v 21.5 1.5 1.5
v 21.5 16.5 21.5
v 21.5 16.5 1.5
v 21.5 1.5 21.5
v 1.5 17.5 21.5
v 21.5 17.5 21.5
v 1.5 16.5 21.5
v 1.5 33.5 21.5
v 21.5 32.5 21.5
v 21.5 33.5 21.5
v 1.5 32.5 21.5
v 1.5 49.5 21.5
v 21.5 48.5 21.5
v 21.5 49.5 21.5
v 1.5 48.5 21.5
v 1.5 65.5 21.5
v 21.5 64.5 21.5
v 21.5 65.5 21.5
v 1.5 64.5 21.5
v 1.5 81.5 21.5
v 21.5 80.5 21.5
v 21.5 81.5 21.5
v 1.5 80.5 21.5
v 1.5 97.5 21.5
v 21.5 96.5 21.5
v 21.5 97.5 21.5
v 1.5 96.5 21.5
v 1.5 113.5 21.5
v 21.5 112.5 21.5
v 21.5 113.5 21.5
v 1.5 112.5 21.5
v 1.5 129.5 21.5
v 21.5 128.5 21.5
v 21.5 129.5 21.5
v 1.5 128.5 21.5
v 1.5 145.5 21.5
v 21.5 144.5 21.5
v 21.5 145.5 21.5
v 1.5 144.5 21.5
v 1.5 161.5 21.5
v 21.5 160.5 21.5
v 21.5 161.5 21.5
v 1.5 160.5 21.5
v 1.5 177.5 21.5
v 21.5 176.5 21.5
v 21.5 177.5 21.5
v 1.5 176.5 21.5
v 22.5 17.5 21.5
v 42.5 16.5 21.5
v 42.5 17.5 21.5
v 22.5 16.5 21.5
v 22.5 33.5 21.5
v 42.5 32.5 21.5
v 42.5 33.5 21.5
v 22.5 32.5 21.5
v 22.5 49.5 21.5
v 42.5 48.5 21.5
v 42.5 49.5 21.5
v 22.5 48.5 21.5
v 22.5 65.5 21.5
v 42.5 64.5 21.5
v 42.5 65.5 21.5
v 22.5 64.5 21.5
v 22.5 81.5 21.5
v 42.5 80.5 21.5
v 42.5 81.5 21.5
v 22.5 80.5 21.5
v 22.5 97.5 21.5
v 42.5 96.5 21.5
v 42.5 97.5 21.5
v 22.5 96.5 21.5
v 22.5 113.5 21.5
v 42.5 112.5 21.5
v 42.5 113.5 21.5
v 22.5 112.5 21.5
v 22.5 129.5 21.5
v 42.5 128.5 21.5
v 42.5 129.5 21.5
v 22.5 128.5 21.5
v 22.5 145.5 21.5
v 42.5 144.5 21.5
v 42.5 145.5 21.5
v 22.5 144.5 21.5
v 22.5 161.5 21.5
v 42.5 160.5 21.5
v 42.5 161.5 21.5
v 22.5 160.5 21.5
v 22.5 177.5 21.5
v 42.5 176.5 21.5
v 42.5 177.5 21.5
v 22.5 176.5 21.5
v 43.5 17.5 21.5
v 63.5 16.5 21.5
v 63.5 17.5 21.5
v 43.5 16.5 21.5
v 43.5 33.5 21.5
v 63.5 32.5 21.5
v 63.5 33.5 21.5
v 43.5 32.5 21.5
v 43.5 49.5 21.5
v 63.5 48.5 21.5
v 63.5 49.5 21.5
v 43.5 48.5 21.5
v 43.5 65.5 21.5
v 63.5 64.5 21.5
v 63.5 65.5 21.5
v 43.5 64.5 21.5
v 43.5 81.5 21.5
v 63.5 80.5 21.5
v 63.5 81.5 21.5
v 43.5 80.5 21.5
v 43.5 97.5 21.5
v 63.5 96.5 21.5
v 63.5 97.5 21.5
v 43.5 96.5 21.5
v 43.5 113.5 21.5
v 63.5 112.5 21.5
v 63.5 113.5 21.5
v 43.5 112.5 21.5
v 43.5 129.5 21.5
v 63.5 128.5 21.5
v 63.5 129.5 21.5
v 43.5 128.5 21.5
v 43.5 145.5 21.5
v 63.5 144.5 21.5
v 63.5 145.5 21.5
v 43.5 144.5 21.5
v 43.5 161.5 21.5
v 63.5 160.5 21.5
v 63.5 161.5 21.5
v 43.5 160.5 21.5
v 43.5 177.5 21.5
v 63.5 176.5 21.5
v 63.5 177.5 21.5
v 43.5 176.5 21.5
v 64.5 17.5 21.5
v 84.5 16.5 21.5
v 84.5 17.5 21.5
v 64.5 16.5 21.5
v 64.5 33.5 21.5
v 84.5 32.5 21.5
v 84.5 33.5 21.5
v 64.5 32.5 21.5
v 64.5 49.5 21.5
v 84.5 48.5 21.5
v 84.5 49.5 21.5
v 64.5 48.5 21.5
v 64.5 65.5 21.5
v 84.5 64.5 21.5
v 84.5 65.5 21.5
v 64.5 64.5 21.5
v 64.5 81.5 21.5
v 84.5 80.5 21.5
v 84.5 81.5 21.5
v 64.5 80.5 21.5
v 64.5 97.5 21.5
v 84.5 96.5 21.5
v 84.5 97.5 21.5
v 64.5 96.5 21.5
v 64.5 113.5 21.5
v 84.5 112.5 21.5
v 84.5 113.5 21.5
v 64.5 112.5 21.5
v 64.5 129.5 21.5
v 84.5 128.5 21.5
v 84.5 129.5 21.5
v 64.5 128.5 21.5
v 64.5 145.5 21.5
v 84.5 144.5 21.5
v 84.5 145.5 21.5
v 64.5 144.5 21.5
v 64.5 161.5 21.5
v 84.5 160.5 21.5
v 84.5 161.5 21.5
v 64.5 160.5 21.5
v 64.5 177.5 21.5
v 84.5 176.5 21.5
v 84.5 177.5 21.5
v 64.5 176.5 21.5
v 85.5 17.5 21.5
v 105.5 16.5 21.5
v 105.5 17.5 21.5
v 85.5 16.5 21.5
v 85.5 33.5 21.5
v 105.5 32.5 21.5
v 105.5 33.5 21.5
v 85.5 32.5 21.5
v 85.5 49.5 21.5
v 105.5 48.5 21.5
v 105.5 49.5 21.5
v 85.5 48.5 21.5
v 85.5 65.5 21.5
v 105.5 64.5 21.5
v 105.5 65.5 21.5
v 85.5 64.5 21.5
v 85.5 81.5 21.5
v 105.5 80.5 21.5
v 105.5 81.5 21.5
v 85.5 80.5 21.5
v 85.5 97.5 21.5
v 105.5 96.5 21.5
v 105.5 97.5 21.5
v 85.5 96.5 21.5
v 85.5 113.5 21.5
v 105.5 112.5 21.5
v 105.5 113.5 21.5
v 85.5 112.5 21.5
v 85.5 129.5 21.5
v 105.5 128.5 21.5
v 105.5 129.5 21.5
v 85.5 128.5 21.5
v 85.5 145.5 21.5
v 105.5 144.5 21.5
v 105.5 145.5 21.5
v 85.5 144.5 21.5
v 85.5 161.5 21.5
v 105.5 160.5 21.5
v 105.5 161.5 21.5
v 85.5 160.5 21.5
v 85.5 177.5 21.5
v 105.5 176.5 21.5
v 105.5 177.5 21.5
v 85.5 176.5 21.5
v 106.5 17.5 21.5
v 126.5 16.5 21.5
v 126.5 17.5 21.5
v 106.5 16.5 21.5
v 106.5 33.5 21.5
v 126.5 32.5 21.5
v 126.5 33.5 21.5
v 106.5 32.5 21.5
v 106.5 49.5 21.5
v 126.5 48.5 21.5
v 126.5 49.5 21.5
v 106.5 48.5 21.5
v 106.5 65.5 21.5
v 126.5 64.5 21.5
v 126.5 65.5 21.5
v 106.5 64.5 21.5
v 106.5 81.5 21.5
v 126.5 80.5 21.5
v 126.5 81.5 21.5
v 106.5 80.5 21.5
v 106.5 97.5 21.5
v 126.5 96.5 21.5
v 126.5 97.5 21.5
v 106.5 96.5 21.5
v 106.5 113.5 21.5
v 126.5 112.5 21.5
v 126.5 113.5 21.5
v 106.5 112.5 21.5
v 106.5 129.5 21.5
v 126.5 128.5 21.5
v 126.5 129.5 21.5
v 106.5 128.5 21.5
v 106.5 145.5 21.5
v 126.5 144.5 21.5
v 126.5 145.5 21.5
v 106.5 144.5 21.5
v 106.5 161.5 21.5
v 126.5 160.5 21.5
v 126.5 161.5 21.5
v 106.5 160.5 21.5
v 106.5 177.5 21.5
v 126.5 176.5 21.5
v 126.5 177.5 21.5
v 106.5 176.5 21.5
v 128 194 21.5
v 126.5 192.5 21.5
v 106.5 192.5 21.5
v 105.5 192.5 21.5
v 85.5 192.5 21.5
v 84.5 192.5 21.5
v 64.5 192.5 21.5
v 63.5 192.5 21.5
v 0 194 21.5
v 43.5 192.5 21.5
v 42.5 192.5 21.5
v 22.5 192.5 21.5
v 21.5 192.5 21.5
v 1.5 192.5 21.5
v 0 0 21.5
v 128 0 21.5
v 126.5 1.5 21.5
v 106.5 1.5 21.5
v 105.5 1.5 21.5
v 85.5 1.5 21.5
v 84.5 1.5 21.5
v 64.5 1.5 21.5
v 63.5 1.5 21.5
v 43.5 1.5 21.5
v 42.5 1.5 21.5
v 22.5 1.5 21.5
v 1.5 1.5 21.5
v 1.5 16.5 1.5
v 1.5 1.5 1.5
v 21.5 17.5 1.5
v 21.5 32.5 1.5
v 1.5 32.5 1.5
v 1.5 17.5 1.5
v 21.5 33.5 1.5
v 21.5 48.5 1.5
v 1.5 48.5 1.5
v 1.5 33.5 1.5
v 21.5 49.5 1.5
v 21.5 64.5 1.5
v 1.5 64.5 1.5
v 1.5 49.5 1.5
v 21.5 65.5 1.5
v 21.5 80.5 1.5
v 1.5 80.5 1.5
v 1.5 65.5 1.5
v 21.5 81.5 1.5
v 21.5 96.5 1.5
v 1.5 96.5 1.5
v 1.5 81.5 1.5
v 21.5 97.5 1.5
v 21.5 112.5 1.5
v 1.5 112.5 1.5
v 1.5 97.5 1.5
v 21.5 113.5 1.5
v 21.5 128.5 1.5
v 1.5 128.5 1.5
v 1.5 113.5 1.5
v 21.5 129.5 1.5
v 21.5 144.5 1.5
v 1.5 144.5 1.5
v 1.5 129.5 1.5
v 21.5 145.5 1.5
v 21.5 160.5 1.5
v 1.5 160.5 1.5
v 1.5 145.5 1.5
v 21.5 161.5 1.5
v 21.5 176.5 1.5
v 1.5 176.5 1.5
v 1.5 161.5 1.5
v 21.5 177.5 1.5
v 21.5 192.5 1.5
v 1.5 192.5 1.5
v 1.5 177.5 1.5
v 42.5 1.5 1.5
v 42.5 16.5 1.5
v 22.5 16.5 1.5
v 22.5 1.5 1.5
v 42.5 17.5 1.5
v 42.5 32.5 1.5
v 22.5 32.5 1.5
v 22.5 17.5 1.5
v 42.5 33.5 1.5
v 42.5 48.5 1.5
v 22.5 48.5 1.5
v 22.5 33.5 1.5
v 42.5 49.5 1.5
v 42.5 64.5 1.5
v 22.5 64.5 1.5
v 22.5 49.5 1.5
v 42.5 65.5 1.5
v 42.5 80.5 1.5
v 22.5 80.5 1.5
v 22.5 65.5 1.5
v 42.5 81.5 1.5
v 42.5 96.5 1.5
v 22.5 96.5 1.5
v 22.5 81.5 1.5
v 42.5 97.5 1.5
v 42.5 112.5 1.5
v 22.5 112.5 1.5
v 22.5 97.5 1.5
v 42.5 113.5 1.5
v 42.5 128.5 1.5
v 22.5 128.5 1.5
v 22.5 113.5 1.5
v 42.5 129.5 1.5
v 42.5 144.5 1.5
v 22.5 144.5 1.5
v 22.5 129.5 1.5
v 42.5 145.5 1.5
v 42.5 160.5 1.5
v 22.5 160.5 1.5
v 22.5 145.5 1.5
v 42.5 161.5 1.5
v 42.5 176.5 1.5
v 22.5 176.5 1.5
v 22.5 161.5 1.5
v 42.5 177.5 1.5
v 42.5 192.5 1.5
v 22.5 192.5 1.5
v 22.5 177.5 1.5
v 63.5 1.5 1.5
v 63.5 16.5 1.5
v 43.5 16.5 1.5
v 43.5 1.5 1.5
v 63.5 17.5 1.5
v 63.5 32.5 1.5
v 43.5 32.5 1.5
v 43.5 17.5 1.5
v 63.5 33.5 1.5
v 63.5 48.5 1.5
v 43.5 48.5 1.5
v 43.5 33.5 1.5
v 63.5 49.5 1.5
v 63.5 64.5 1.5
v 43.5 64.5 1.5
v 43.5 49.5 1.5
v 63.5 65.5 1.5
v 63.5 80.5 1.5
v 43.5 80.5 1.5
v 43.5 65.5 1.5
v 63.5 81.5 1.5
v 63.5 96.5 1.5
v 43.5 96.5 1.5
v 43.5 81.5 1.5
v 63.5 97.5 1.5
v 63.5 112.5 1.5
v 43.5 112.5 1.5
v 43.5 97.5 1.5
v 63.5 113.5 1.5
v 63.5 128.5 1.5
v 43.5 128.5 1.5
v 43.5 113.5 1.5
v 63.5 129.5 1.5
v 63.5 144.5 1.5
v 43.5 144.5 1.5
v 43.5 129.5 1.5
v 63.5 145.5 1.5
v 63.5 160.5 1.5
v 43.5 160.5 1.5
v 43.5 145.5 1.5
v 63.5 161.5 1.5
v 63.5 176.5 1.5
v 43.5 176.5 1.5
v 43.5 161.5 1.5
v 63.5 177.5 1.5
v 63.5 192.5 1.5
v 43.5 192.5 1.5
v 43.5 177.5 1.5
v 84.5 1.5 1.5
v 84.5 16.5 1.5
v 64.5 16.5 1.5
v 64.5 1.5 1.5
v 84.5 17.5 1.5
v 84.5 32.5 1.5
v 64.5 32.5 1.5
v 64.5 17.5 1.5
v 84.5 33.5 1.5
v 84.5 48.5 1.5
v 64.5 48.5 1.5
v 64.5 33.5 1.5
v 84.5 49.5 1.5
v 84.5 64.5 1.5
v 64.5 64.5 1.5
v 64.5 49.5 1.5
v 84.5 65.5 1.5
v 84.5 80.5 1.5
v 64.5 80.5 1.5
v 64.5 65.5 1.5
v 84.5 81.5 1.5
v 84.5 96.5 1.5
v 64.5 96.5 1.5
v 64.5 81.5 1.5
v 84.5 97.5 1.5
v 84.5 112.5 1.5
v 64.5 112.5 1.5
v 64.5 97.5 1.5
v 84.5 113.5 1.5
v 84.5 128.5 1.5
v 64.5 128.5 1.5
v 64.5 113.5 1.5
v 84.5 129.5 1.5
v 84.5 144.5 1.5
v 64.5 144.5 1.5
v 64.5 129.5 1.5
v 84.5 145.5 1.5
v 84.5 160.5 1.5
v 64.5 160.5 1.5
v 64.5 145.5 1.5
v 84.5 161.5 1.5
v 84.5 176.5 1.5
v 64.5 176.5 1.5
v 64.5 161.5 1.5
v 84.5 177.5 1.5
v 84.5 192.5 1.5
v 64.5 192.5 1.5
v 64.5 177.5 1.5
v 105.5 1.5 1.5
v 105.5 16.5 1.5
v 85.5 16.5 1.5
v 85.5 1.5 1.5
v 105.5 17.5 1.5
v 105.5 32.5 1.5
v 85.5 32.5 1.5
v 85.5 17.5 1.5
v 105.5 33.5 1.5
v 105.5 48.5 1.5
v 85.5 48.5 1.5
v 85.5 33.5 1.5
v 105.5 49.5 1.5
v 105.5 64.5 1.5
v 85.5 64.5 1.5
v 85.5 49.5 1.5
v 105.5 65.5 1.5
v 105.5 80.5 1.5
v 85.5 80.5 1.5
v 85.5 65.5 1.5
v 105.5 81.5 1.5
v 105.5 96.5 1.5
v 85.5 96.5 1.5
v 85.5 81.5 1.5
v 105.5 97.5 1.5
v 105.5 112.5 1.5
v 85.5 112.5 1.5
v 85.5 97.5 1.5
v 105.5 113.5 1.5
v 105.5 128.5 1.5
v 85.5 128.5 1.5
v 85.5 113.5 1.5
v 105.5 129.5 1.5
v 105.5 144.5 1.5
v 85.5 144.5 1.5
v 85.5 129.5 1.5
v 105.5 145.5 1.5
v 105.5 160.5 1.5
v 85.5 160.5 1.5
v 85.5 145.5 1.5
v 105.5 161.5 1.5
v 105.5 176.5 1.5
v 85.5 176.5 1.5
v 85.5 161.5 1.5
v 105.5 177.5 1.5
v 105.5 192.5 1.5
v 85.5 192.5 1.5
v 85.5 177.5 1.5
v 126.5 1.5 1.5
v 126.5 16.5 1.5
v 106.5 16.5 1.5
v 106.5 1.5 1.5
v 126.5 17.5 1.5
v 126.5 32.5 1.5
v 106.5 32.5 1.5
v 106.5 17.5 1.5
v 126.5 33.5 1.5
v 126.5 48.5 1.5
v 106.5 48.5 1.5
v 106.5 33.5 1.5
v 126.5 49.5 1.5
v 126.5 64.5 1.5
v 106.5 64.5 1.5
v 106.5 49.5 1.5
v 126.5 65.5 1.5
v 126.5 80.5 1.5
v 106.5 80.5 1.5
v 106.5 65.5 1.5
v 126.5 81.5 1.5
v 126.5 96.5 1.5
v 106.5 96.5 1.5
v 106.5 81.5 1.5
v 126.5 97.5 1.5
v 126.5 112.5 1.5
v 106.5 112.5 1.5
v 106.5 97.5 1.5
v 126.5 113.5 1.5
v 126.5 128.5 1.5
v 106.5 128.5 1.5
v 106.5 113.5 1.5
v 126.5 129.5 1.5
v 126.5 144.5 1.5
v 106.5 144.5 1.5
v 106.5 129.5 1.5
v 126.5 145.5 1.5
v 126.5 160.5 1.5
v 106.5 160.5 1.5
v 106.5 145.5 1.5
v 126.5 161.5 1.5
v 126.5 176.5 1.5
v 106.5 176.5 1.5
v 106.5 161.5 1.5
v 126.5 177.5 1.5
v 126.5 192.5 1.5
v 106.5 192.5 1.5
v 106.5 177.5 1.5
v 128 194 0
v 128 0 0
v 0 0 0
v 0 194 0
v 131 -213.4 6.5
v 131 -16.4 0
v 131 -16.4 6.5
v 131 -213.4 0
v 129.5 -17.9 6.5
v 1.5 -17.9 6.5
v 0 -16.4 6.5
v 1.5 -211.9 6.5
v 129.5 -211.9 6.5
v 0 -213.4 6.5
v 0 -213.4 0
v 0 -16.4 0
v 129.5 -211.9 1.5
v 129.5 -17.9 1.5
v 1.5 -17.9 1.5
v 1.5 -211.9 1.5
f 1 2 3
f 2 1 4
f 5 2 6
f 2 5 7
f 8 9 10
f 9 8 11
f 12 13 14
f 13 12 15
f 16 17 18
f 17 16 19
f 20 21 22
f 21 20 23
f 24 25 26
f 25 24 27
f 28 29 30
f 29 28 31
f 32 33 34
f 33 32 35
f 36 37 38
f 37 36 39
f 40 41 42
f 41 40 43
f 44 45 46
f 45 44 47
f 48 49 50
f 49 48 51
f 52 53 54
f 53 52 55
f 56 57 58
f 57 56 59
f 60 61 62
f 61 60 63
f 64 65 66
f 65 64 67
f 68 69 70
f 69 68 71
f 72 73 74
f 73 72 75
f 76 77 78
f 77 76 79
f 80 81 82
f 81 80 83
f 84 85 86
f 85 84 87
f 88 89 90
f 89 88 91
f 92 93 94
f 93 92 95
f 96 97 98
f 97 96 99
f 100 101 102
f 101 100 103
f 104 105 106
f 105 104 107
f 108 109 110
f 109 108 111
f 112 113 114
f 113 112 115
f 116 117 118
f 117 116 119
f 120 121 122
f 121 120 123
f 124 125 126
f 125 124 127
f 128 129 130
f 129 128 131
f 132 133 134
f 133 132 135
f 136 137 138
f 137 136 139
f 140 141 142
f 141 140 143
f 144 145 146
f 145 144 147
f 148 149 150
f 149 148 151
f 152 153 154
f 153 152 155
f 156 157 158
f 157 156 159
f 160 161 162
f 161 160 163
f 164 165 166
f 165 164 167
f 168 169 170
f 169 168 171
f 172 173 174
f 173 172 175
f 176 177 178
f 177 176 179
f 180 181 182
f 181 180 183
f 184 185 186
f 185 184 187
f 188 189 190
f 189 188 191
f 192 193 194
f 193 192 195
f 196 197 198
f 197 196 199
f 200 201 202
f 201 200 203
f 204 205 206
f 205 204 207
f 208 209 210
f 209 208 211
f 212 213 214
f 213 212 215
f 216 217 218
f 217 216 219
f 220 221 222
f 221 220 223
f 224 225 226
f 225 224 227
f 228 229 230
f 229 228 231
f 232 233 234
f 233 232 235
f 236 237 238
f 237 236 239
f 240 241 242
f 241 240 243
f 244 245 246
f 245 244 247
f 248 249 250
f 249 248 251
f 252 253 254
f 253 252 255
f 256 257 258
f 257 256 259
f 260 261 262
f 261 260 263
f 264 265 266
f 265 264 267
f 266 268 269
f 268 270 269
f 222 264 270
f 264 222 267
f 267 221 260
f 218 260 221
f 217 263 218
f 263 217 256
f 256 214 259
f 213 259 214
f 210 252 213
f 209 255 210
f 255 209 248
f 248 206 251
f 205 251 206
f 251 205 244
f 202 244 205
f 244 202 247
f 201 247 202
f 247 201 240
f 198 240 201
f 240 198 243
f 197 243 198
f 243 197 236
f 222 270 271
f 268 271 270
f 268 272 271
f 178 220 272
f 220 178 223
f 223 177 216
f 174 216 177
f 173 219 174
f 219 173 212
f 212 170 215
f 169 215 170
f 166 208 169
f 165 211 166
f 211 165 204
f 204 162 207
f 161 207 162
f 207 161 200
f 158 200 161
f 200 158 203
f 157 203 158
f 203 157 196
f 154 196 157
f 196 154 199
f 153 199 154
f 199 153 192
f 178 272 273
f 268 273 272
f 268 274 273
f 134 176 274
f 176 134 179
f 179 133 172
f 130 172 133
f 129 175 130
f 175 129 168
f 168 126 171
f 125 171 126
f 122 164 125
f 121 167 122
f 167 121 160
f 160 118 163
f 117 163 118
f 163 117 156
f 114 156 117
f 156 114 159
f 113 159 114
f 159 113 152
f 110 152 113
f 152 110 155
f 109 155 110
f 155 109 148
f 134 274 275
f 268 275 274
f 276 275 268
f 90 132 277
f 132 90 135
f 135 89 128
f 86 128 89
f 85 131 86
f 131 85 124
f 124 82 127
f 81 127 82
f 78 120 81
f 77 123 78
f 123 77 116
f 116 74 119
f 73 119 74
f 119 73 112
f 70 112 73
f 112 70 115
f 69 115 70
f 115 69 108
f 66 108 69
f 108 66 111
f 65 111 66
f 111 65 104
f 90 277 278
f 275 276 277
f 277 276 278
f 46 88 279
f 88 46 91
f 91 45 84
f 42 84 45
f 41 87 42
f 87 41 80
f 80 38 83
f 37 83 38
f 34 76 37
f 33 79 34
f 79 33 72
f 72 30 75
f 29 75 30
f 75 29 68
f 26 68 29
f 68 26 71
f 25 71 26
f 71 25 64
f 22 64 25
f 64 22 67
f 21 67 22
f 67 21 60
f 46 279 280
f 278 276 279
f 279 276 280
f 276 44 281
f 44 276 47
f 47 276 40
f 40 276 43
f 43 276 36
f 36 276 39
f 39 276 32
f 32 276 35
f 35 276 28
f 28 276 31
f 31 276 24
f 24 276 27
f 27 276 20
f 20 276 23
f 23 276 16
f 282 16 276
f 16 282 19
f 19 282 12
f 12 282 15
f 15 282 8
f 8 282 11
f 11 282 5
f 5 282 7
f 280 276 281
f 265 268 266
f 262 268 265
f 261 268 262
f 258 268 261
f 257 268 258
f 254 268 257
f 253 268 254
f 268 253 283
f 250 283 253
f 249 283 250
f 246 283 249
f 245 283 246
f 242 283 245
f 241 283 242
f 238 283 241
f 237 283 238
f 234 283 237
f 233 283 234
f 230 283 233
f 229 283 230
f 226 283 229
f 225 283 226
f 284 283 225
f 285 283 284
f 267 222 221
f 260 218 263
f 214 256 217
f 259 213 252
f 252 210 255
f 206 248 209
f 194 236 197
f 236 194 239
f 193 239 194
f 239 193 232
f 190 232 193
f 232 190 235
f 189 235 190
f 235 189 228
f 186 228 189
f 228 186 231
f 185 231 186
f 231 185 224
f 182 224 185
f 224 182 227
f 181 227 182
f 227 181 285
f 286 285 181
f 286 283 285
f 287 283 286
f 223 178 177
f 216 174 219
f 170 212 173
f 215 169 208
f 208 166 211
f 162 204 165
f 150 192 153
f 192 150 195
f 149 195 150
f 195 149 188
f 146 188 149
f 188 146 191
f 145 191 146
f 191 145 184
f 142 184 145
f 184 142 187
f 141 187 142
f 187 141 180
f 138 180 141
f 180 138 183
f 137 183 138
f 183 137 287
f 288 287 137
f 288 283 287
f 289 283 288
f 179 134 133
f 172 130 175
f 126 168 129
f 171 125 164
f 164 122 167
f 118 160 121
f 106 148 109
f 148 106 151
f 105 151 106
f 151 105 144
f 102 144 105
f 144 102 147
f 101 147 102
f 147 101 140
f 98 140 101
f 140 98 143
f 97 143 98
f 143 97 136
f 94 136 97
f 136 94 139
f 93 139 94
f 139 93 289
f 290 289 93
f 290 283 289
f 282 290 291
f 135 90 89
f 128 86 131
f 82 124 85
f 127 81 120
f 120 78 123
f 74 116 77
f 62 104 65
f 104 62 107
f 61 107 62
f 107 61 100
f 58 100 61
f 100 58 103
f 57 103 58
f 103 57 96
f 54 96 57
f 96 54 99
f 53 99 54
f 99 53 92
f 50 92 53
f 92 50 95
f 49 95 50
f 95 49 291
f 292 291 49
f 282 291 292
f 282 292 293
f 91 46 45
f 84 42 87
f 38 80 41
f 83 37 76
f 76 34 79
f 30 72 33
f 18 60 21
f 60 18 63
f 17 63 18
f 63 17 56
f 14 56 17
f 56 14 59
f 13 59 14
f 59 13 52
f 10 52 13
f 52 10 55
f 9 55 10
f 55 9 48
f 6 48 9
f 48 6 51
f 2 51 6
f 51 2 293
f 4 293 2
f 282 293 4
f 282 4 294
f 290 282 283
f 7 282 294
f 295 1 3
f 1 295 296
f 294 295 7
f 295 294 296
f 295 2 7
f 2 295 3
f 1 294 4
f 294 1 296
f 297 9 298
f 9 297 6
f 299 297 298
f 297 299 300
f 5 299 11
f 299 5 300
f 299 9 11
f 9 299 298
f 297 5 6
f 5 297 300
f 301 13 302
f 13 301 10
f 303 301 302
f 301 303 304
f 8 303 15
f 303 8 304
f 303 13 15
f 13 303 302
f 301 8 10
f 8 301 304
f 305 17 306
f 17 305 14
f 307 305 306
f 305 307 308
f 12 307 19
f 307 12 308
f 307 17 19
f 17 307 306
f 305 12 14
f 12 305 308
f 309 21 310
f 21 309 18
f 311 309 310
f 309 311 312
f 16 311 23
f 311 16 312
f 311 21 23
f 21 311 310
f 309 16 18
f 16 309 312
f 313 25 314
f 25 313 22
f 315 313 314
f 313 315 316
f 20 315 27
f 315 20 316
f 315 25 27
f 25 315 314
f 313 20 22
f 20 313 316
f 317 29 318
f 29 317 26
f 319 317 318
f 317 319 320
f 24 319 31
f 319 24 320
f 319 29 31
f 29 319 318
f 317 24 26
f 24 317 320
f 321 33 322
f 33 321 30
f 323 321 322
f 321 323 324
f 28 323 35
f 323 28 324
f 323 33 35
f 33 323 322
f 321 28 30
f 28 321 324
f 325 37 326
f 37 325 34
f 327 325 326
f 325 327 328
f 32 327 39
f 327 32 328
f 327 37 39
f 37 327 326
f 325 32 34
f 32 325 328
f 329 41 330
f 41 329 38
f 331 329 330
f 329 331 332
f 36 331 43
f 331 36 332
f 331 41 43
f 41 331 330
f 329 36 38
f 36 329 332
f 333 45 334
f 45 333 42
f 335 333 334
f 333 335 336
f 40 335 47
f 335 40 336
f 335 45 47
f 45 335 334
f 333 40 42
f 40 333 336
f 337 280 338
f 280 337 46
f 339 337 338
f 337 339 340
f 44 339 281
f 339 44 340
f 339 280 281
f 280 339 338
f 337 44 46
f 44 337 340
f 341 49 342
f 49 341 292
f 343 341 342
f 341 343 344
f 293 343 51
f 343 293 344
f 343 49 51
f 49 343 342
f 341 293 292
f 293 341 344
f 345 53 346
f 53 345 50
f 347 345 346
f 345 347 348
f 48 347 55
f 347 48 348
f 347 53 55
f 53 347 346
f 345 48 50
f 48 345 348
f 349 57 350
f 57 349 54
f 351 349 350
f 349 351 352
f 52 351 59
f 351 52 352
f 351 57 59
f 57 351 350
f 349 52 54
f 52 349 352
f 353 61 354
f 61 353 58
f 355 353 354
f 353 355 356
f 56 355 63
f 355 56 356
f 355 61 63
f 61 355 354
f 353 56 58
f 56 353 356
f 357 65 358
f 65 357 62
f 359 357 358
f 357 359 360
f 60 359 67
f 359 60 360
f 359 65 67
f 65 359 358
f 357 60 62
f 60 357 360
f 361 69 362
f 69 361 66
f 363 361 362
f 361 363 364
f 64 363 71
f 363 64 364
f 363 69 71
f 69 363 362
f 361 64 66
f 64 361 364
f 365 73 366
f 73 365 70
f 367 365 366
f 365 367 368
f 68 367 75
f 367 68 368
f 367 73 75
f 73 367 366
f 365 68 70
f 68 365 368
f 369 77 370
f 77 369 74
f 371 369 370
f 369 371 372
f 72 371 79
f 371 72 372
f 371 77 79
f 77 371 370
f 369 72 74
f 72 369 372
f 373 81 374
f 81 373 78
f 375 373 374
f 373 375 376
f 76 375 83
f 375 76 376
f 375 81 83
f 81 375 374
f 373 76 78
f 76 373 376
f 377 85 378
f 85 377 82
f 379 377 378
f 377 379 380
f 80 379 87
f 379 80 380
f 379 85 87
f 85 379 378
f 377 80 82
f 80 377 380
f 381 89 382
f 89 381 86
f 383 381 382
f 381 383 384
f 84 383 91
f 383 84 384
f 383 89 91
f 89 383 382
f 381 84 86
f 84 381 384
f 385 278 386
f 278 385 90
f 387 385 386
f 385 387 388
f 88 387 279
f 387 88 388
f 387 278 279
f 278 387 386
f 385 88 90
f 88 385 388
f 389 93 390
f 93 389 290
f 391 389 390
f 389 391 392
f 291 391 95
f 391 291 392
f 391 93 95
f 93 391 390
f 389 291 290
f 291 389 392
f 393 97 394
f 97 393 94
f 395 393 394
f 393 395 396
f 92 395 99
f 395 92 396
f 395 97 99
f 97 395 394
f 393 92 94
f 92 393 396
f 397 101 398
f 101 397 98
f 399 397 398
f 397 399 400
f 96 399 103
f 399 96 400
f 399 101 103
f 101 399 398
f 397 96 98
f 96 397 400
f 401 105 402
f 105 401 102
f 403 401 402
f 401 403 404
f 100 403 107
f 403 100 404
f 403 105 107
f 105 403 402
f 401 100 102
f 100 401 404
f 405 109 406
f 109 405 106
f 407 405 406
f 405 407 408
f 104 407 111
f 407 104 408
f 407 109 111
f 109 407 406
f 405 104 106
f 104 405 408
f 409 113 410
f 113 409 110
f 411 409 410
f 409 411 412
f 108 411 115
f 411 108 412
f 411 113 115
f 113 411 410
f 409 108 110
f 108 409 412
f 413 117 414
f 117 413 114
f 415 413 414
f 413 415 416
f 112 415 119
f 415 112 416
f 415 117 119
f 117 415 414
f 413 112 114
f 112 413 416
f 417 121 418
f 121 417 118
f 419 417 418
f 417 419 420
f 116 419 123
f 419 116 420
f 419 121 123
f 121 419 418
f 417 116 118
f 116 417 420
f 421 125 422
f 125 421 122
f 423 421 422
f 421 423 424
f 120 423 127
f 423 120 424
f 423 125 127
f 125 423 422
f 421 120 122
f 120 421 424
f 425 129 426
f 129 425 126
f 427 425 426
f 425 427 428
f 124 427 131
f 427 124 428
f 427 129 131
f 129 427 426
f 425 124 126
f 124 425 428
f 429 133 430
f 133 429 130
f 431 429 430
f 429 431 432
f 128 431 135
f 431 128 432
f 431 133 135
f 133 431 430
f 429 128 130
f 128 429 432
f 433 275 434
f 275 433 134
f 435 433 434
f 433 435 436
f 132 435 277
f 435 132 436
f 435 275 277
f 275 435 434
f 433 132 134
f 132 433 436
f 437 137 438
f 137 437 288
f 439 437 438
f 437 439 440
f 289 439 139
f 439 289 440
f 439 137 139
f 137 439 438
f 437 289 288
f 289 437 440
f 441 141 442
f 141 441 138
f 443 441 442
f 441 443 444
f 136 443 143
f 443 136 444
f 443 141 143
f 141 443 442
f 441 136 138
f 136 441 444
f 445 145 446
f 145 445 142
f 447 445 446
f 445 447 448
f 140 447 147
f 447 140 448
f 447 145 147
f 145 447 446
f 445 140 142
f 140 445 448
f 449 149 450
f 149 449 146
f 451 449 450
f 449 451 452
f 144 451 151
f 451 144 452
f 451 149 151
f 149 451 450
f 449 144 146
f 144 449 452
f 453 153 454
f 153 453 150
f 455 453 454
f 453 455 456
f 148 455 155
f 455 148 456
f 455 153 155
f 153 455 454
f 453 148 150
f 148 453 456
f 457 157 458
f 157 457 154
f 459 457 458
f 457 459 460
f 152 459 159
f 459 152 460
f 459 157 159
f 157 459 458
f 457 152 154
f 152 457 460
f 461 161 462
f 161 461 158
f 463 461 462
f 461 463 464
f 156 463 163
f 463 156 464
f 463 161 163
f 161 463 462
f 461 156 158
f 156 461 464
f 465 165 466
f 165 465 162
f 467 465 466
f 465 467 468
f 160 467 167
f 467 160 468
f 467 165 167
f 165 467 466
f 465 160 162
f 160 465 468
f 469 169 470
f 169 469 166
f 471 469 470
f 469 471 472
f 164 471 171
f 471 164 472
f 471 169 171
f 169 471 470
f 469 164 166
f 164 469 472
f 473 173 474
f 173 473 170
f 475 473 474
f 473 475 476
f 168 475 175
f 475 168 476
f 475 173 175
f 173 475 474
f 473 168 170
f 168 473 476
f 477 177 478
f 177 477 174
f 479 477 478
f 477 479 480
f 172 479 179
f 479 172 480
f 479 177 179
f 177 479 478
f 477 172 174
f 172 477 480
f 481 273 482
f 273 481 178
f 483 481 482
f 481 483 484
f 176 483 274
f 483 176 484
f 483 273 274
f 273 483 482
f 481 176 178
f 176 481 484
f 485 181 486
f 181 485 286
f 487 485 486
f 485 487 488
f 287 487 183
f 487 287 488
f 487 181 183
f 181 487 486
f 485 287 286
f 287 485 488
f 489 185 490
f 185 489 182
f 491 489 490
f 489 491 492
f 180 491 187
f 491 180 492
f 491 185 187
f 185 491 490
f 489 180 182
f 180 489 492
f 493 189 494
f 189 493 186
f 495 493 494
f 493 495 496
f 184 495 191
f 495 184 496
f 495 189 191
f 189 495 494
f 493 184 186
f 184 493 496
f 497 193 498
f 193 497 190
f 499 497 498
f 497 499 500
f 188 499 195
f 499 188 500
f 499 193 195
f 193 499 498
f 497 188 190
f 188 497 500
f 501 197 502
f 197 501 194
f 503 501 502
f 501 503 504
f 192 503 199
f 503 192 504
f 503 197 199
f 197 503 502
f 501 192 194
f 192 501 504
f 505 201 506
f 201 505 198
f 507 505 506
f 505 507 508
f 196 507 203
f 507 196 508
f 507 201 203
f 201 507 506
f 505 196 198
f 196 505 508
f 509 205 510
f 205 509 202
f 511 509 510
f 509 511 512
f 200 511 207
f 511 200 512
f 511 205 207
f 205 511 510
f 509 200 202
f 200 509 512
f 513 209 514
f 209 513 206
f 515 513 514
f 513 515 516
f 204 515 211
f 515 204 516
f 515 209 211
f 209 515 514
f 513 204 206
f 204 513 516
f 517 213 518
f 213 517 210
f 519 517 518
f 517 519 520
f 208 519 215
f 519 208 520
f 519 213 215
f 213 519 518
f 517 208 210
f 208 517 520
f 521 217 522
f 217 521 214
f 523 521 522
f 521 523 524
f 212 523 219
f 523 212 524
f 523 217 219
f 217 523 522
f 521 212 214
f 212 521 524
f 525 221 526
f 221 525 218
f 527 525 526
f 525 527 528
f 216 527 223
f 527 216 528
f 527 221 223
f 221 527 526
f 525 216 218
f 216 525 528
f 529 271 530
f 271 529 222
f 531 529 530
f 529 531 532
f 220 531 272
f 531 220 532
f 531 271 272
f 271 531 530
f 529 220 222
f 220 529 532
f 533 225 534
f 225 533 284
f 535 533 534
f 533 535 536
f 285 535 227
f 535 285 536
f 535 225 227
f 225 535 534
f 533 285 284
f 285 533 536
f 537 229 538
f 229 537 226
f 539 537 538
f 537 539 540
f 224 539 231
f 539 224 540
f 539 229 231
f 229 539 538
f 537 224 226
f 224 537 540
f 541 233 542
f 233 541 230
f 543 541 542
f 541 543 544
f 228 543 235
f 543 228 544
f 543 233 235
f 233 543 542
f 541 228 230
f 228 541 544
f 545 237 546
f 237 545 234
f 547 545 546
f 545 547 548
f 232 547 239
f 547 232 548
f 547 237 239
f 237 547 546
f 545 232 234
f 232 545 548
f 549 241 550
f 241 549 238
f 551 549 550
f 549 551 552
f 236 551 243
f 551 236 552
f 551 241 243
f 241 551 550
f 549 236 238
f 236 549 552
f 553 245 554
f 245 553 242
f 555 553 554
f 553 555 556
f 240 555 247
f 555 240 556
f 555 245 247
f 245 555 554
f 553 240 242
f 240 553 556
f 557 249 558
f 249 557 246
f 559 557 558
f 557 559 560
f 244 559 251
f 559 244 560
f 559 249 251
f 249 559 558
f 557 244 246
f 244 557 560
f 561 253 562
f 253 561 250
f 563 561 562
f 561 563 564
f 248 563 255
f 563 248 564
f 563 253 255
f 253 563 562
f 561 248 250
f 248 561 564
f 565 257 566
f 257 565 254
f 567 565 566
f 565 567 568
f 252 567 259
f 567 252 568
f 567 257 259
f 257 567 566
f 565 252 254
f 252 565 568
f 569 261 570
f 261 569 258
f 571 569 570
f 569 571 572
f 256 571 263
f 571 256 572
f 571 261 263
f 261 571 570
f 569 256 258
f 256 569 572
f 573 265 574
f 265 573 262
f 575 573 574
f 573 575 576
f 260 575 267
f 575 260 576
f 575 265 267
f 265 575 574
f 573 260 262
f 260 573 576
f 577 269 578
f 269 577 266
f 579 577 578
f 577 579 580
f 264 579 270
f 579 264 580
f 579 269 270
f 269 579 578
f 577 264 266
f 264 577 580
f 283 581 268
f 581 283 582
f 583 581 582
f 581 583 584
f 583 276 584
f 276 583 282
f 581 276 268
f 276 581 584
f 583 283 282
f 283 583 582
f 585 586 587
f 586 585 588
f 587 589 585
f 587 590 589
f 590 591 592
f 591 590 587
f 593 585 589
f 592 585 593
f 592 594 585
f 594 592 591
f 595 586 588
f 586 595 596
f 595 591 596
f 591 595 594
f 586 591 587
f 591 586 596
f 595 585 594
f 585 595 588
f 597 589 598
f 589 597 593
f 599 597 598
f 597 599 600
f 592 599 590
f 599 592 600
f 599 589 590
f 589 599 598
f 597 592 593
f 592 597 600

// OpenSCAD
// This is a bin with a parameterized number of compartments, interior of the compartments, thickness of compartment walls, thickness of the exterior wall, lid tolerance, and lid overhang
compartmentLength = 20;
compartmentWidth = 15;
compartmentHeight = 20;
compartmentRows = 6;
compartmentColumns = 12;
interiorWallThickness = 1;
exteriorWallThickness = 1.5;
lidTolerance = 0; // This is the amount larger than the exterior of the box the interior of the lid will be
lidOverhang = 5; // This is the amount that the lid hangs down past the top of the box. A value of 0 would result in a flat surface for the lid.

function getInteriorDimensions(compartmentLength, compartmentWidth, compartmentHeight) = [compartmentLength, compartmentWidth, compartmentHeight];
function getExteriorDimensions(compartmentLength, compartmentWidth, compartmentHeight, interiorWallThickness, exteriorWallThickness, compartmentRows, compartmentColumns) = [compartmentRows * compartmentLength, compartmentColumns * compartmentWidth, compartmentHeight] + [2*exteriorWallThickness + (compartmentRows-1)*interiorWallThickness, 2*exteriorWallThickness + (compartmentColumns-1)*interiorWallThickness, exteriorWallThickness];
function getLidInteriorDimensions(exteriorDimensions, lidTolerance, lidOverhang) = [exteriorDimensions[0]+(2*lidTolerance), exteriorDimensions[1]+2*lidTolerance, lidOverhang];
function getLidExteriorDimensions(lidInteriorDimensions, exteriorWallThickness) = lidInteriorDimensions + [2*exteriorWallThickness, 2*exteriorWallThickness, exteriorWallThickness];

// Box
module parameterized_compartments(compartmentLength, compartmentWidth, compartmentHeight, compartmentRows, compartmentColumns, interiorWallThickness, exteriorWallThickness){
    interiorDimensions = getInteriorDimensions(compartmentLength, compartmentWidth, compartmentHeight);
    exteriorDimensions = getExteriorDimensions(compartmentLength, compartmentWidth, compartmentHeight, interiorWallThickness, exteriorWallThickness, compartmentRows, compartmentColumns);

    difference(){
        cube(exteriorDimensions, center=false);
        for(rowIndex=[0:1:compartmentRows-1]){
            for(columnIndex=[0:1:compartmentColumns-1]){
                translate([exteriorWallThickness+(rowIndex*(interiorWallThickness+compartmentLength)), exteriorWallThickness+(columnIndex*(interiorWallThickness+compartmentWidth)), exteriorWallThickness]){
                    cube(interiorDimensions, center=false);
                }
            }
        }
    }
}

// Lid
module parameterized_compartment_lid(compartmentLength, compartmentWidth, compartmentHeight, compartmentRows, compartmentColumns, interiorWallThickness, exteriorWallThickness, lidTolerance, lidOverhang){
    exteriorDimensions = getExteriorDimensions(compartmentLength, compartmentWidth, compartmentHeight, interiorWallThickness, exteriorWallThickness, compartmentRows, compartmentColumns);
    lidInteriorDimensions = getLidInteriorDimensions(exteriorDimensions, lidTolerance, lidOverhang);
    lidExteriorDimensions = getLidExteriorDimensions(lidInteriorDimensions, exteriorWallThickness);

    difference(){
        cube(lidExteriorDimensions, center=false);
        translate([exteriorWallThickness, exteriorWallThickness, exteriorWallThickness]){
            cube(lidInteriorDimensions, center=false);
        }
    }
}

parameterized_compartments(compartmentLength, compartmentWidth, compartmentHeight, compartmentRows, compartmentColumns, interiorWallThickness, exteriorWallThickness);
exteriorWidth = getExteriorDimensions(compartmentLength, compartmentWidth, compartmentHeight, interiorWallThickness, exteriorWallThickness, compartmentRows, compartmentColumns)[1];
translate([0, exteriorWidth * -1.1, 0]){
    parameterized_compartment_lid(compartmentLength, compartmentWidth, compartmentHeight, compartmentRows, compartmentColumns, interiorWallThickness, exteriorWallThickness, lidTolerance, lidOverhang);
}
